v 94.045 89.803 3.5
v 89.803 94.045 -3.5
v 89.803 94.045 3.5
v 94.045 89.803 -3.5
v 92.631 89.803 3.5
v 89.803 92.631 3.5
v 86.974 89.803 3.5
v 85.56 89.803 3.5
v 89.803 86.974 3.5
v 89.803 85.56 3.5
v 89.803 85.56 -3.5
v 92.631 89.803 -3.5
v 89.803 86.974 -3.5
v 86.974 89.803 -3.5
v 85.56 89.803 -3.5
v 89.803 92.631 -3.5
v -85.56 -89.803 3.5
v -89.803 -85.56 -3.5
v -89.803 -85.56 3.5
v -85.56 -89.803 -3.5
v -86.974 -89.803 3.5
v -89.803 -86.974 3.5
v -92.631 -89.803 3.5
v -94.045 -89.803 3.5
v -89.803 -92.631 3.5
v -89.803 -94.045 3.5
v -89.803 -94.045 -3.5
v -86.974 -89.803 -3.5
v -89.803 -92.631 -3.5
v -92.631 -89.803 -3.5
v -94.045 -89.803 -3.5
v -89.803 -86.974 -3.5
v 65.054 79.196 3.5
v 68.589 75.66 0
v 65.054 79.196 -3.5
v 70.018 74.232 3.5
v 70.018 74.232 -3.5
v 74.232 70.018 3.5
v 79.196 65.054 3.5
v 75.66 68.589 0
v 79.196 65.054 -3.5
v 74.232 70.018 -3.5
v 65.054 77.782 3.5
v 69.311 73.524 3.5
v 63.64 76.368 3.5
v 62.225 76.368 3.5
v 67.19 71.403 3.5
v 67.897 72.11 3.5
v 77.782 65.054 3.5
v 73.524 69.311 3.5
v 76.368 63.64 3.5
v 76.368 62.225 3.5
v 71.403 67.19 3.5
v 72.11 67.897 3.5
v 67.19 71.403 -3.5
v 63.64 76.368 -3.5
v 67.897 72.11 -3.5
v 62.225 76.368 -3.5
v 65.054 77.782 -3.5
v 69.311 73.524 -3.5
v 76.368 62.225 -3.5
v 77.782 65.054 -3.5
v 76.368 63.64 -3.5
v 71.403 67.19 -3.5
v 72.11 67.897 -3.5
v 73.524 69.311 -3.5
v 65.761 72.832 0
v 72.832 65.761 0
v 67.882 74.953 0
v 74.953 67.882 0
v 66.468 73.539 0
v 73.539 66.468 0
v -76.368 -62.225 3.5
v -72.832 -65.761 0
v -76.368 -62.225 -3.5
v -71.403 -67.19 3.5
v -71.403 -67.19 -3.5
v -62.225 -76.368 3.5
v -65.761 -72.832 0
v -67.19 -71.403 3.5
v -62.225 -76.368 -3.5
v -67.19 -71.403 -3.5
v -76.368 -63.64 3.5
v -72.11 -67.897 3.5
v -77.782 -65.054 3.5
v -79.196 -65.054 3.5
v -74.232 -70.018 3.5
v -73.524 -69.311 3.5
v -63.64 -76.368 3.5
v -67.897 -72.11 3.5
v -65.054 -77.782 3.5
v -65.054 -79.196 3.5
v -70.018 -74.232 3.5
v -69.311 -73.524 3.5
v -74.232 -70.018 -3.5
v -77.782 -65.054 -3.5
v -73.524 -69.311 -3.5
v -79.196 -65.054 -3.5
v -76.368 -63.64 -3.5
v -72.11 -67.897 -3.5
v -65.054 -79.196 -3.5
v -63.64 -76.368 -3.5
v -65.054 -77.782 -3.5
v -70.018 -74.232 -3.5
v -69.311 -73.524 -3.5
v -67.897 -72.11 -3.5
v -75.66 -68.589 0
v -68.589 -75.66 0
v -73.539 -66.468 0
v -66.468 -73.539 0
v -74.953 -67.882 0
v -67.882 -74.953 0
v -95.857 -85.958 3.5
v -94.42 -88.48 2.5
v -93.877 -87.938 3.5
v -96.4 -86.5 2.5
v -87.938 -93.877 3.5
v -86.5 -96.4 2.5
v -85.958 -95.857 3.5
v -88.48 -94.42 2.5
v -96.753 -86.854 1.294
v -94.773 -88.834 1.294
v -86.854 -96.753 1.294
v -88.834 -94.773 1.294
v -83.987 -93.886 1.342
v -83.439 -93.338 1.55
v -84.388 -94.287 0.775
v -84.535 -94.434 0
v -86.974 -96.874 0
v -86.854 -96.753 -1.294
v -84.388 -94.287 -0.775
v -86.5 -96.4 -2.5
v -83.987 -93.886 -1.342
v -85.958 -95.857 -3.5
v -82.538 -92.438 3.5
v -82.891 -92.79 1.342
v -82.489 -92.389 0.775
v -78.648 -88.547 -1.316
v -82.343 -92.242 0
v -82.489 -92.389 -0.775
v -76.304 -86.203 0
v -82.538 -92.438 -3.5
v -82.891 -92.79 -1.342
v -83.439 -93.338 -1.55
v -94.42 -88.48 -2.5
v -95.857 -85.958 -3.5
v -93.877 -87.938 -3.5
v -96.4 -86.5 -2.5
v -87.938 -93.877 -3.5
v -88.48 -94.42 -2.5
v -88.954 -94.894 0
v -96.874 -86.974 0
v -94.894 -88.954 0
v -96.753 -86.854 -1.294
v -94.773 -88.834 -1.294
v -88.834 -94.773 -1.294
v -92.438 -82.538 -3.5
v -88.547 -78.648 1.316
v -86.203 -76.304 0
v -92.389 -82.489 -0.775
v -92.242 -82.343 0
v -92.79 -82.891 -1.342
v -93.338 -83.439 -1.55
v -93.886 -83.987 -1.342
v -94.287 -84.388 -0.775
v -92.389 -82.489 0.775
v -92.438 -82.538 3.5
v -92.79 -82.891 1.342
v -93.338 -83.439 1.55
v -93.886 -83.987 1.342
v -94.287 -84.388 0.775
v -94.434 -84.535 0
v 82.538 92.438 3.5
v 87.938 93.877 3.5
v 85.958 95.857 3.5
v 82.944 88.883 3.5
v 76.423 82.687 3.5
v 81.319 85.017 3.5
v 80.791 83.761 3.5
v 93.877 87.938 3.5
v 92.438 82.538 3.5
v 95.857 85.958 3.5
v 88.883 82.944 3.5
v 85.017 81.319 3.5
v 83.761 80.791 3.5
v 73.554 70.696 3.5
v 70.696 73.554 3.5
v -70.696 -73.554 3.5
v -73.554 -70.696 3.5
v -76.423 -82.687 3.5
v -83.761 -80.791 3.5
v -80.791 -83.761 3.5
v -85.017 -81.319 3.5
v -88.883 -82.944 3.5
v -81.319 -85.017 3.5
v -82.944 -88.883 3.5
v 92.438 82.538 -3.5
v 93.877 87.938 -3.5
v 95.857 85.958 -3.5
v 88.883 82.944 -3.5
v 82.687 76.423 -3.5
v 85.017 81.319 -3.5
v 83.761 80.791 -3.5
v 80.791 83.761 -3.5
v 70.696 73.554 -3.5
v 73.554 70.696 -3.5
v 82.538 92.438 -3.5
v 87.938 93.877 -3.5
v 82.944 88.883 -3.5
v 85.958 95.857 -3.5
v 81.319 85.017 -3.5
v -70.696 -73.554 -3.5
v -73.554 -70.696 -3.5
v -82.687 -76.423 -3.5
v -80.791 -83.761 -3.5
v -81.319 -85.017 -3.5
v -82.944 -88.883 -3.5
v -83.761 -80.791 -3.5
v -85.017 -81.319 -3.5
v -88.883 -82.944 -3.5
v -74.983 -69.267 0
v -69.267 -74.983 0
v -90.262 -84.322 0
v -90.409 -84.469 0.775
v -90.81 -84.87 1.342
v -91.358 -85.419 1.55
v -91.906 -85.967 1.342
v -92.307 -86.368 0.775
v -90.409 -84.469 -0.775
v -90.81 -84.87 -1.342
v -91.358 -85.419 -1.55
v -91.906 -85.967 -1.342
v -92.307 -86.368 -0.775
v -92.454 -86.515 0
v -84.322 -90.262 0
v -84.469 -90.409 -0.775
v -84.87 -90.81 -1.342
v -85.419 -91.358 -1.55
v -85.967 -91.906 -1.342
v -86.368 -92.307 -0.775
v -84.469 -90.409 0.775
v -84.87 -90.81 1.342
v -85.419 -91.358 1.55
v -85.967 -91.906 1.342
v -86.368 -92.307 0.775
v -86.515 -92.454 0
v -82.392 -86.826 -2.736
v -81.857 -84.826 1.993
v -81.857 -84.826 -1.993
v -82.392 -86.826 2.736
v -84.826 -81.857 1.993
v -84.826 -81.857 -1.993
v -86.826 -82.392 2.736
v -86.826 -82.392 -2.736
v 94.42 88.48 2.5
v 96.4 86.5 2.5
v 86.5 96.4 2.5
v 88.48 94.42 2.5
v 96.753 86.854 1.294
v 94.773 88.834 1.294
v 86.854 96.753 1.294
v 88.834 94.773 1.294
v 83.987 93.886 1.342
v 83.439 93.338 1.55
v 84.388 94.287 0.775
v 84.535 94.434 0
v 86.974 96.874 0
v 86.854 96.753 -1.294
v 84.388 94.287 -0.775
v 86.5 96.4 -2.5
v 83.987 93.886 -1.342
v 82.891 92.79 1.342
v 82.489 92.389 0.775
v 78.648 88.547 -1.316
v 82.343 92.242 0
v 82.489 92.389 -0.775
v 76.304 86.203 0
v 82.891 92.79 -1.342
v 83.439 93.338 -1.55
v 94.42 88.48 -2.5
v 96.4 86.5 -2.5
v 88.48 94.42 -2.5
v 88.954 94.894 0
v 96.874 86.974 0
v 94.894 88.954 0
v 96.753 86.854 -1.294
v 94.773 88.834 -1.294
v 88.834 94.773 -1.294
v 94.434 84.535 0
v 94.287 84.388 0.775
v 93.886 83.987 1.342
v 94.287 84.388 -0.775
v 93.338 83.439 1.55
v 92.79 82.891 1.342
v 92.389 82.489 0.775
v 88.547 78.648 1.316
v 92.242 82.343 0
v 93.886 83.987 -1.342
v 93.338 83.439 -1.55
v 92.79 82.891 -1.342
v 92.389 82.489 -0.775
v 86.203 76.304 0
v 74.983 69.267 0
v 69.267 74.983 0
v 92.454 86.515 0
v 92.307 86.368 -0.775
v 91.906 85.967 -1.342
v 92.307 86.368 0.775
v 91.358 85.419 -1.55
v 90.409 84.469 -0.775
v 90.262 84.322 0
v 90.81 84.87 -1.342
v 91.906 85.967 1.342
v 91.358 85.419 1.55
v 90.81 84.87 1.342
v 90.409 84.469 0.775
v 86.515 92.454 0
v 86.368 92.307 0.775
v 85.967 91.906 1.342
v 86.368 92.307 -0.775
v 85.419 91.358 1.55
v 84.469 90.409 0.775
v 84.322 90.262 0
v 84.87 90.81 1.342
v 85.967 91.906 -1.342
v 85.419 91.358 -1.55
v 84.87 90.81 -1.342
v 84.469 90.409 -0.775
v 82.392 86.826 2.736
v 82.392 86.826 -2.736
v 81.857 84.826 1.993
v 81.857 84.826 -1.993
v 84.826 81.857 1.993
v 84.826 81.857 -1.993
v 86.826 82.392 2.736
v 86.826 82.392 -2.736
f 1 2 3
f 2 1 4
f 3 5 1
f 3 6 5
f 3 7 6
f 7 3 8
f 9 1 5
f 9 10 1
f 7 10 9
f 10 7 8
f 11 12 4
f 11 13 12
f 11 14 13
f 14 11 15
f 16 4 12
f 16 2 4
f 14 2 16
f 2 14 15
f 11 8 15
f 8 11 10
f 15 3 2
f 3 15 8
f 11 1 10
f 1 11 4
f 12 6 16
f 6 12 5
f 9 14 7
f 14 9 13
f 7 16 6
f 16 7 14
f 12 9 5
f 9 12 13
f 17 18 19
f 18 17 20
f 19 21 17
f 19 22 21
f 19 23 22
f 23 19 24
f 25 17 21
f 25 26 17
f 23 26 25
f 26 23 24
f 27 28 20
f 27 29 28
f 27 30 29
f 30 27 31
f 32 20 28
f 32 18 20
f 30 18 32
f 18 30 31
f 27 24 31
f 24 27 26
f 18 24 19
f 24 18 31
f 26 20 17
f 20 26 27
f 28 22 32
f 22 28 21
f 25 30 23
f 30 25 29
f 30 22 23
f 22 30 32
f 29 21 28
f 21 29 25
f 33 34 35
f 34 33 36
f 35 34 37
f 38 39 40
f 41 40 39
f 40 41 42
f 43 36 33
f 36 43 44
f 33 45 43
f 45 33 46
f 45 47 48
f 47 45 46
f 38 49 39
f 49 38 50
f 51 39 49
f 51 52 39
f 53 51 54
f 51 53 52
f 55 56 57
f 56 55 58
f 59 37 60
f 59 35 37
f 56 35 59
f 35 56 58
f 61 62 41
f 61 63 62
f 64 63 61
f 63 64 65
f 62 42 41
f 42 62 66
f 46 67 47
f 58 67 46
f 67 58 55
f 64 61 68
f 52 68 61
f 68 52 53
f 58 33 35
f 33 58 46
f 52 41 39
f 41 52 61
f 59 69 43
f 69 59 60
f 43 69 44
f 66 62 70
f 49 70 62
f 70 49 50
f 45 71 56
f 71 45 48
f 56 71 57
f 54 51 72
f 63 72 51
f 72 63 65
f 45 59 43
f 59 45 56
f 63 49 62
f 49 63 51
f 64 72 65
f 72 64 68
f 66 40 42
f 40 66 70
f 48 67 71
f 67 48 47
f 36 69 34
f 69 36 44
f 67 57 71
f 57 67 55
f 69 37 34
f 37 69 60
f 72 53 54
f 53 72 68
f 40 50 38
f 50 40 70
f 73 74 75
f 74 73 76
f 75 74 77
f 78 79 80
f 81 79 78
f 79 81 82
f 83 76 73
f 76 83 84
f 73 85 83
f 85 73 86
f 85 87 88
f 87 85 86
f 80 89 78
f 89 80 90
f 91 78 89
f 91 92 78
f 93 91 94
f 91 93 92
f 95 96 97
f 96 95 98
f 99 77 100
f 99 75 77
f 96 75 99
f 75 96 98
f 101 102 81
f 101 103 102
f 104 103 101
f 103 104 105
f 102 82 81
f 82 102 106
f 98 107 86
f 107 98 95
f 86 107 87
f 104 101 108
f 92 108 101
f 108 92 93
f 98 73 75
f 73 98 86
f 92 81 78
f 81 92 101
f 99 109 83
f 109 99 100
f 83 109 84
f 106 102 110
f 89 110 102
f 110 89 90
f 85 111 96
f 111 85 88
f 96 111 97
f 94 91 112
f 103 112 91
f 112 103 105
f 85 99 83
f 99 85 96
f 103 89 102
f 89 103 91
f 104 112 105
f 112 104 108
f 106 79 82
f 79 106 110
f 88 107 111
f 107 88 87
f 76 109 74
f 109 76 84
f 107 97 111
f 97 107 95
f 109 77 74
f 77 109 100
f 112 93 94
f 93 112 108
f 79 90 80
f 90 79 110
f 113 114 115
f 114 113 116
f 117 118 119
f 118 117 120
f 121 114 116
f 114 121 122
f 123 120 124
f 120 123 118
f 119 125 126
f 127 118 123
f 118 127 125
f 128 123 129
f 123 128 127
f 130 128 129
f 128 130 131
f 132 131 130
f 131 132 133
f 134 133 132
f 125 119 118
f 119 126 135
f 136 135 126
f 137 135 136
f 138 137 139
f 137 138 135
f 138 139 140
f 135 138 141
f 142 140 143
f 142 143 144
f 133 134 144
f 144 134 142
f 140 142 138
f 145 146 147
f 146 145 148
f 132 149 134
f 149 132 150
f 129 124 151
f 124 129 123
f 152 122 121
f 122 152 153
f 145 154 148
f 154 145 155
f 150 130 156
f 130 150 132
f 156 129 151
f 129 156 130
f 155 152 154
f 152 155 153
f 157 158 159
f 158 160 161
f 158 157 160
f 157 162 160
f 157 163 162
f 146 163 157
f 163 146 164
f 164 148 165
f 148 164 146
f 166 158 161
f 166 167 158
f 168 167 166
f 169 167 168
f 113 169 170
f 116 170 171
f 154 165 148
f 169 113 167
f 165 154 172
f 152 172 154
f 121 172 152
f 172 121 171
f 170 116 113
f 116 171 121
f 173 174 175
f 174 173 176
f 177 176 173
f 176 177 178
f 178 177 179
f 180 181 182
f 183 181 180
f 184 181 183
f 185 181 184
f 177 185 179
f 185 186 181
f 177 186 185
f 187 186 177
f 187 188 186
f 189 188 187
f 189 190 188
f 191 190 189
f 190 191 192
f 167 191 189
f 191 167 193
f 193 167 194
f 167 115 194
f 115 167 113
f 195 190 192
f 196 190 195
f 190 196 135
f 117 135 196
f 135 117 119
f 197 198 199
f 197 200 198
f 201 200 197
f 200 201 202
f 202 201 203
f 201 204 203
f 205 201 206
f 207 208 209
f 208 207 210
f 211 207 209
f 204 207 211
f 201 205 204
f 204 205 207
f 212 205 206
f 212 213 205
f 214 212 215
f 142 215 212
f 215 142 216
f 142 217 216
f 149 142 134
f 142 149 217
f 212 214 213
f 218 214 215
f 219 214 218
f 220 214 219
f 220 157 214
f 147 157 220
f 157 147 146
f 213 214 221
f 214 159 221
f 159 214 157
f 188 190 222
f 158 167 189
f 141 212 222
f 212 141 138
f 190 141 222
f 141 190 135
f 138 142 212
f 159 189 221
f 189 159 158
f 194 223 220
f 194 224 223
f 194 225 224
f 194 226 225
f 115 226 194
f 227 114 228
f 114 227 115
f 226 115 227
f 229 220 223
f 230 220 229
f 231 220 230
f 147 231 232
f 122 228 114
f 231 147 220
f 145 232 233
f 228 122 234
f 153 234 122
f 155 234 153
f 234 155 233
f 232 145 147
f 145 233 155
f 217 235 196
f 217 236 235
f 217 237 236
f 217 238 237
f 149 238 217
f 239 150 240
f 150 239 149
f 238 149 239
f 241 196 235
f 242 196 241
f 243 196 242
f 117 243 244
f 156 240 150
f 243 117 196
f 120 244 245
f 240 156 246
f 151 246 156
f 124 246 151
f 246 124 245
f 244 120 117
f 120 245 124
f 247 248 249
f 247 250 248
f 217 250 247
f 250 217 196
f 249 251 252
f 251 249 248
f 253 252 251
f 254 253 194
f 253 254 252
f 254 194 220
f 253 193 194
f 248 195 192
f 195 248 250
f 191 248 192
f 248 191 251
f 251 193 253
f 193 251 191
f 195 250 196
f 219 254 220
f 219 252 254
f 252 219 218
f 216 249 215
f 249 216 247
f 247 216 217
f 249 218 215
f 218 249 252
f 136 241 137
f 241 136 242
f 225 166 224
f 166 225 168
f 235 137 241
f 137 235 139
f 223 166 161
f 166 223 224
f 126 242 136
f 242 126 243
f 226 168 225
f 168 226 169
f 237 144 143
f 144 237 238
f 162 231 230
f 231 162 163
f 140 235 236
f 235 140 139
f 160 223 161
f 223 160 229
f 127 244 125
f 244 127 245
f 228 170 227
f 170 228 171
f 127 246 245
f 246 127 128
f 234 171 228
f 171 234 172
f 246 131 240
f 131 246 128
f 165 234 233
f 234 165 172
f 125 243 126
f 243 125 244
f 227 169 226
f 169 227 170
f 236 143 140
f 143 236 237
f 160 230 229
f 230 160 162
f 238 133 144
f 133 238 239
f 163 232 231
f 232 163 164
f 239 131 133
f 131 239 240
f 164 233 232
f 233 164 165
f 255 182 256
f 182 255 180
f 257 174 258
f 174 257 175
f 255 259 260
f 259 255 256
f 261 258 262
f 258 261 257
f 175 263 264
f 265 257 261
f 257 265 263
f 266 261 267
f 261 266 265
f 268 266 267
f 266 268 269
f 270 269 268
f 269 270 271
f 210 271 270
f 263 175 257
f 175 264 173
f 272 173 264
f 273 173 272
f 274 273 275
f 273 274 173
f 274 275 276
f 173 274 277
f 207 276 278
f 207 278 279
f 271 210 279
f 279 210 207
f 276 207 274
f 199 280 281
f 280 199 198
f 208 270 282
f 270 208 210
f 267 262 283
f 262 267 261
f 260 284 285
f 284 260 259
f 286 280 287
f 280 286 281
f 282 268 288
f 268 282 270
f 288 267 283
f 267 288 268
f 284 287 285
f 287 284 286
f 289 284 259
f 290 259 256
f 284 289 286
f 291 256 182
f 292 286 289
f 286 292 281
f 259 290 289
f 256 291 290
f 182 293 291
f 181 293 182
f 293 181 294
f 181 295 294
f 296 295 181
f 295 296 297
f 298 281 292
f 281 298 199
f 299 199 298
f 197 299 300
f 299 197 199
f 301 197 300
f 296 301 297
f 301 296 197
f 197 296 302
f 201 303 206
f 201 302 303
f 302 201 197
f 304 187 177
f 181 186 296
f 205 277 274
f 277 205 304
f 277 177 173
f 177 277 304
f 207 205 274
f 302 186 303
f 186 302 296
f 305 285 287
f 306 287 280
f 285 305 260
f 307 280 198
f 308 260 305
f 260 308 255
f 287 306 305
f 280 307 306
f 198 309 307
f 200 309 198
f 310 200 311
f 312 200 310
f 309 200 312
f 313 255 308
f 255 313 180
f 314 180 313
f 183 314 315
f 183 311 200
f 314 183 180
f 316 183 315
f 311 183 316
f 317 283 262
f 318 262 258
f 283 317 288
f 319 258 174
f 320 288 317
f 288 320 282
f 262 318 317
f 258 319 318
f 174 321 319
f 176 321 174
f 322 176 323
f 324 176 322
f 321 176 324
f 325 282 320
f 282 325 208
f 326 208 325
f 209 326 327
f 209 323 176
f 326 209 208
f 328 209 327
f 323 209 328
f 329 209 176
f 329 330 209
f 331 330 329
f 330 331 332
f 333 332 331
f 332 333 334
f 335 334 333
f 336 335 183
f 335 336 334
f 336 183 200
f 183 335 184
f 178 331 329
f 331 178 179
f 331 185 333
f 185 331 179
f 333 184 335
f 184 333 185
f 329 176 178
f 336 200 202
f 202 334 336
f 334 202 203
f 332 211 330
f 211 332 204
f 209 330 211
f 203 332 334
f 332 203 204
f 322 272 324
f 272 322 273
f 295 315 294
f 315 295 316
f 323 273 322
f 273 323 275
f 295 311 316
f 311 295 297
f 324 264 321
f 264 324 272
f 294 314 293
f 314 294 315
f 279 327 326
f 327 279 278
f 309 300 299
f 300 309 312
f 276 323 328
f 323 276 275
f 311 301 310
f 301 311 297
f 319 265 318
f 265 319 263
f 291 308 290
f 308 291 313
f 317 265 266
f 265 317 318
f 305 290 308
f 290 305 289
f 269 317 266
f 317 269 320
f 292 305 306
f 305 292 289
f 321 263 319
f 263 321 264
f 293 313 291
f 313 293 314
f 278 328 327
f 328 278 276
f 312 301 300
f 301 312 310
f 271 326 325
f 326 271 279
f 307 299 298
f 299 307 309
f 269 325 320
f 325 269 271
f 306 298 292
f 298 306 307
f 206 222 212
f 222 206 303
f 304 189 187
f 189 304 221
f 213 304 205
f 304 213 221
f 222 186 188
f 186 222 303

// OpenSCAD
// file: joint.scad
h = 7;
r = h/2 / cos(30);

module stumpy() {
	rotate([0, 90]) rotate([0, 0, 30]) intersection() {
		cylinder(r=r, h=8, center=true, $fn=6);
		sphere(r=5.1, $fn=24);
	}
}

module middle() {
	difference() {
		union() {
			translate([-2, 0, 0]) stumpy();
			translate([2, 0, 0]) stumpy();
			rotate([0, 0, 90]) stumpy();
		}
		rotate([90]) cylinder(r=1.5, h=30, center=true, $fn=12);
		rotate([0, 90]) cylinder(r=1.5, h=30, center=true, $fn=12);
	}
}

module sides() {
	difference() {
		union() {
			translate([-7, 0, 0]) rotate([0, 90])
				cylinder(r=2, h=4, center=true, $fn=12);
			translate([7, 0, 0]) rotate([0, 90])
				cylinder(r=2, h=4, center=true, $fn=12);
			translate([-7, 5, 0]) cube([4, 10, 4], center=true);
			translate([7, 5, 0]) cube([4, 10, 4], center=true);
		}
		rotate([0, 90]) cylinder(r=0.8, h=20, center=true, $fn=12);
	}
}

module jaws() {
	difference() {
		union() {
			intersection () {
				rotate([90]) cylinder(r=5, h=14, center=true, $fn=24);
				translate([-4, 0, 0]) cube([10, 14, h], center=true);
			}
			intersection() {
				translate([10, 0, 0]) cube([26, 14, h], center=true);
				translate([10, 0, 0]) rotate([0, 90]) rotate([0, 0, 30])
					cylinder(r1=10, r2=r, h=26, center=true, $fn=6);
			}
		}
		translate([-1.5, 0, 0]) cube([10, 8.4, 10], center=true);
		translate([3.5, 0, 0]) rotate([0, 0, 30])
			cylinder(r=4.2, h=10, center=true, $fn=6);
		translate([4, 0, 4]) rotate([0, 45])
			rotate([0, 0, 30]) cylinder(r=4.2, h=8, center=true, $fn=6);
		translate([4, 0, -4]) rotate([0, -45])
			rotate([0, 0, 30]) cylinder(r=4.2, h=8, center=true, $fn=6);
		rotate([90]) cylinder(r=1.55, h=40, center=true, $fn=12);
		translate([19, 0, 0]) rotate([0, 90])
			cylinder(r=2.8, h=20, center=true, $fn=12);
	}
}

// % rotate([0, 50]) middle();
jaws();
// main file
use <joint.scad>;

l = 250;
h = 7;
r = h/2 / cos(30);

// Wipe nozzle after long travel moves.
module collar() {
	difference() {
		cube([4, 20, h], center=true);
		cube([2, 18, h+1], center=true);
		rotate([0, 90]) rotate([0, 0, 30])
			cylinder(r=5, h=5, center=true, $fn=6);
	}
}

// Small hollow cube.
module cubicle() {
	difference() {
		cube([6, 6, h], center=true);
		cube([4, 4, h+1], center=true);
	}
}

rotate([0, 0, 45]) {
	// Nozzle wipers.
	translate([l/2+2, 0, 0]) cubicle();
	translate([-l/2-2, 0, 0]) cubicle();
	translate([l/2-25, 0, 0]) collar();
	translate([-l/2+25, 0, 0]) collar();
	// Rod with two Y shaped rod ends.
	union() {
		translate([-l/2, 0, 0]) jaws();
		translate([l/2, 0, 0]) rotate([0, 0, 180]) jaws();
		rotate([0, 90]) rotate([0, 0, 30])
			cylinder(r=r, h=l-18, center=true, $fn=6);
	}
}

// Print platform.
bed = 8*25.4; // 8x8 inches.
% translate([0, 0, -h/2-1]) cube([bed, bed, 2], center=true);
